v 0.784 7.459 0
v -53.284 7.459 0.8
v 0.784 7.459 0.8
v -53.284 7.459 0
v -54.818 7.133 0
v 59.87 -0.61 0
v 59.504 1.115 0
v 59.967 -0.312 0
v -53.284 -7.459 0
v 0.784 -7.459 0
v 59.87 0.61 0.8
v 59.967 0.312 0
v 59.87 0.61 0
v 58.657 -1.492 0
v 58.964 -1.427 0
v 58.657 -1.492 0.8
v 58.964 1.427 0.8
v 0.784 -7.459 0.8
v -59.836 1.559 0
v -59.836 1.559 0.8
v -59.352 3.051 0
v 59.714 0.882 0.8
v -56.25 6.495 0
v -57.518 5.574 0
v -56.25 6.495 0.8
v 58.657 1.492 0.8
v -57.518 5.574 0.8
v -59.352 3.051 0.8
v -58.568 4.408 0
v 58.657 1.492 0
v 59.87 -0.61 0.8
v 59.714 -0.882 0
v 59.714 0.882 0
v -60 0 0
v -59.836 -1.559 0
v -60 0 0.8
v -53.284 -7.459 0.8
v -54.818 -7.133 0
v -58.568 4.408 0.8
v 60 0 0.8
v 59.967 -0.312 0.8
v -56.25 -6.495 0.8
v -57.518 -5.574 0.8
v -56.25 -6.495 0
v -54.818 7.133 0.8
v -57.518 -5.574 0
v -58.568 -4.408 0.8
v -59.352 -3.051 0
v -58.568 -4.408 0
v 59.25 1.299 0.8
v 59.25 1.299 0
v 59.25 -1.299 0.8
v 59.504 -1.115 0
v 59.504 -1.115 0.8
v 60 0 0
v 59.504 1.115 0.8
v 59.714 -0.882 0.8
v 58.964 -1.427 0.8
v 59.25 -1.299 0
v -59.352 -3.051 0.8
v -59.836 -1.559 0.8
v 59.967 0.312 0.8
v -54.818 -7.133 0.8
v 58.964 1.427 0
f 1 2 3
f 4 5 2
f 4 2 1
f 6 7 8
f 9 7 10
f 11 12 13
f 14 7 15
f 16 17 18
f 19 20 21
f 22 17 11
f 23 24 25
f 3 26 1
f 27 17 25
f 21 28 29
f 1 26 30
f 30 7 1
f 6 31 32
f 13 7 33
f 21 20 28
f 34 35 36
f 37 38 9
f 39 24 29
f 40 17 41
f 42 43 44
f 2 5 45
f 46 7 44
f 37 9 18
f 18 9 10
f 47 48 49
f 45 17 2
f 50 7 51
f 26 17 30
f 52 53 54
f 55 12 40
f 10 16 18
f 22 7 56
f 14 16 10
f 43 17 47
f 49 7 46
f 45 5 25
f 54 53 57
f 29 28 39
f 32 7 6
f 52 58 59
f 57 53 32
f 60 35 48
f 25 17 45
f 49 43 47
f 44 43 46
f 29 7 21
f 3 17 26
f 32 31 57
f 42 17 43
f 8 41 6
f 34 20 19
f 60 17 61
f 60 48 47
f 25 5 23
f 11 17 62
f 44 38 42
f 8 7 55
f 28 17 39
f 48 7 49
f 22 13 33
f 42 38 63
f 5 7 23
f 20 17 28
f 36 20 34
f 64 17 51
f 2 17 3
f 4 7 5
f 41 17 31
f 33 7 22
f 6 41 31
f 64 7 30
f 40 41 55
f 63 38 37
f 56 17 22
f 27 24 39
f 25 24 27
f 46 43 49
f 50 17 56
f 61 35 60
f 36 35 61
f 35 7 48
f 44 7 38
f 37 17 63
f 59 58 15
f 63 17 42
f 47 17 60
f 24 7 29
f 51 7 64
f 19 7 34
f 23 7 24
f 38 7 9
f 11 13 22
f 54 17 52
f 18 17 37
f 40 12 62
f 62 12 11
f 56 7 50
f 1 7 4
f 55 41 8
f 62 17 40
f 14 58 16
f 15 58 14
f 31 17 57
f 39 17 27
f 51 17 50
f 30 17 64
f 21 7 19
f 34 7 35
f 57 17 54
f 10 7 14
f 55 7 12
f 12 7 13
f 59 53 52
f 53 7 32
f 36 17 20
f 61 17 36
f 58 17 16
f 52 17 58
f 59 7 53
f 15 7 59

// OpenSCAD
WIDTH = 15;
LENGTH = 120;
THICKNESS = 0.8;
POINT = 3;

$fn = 30;

hull() {
    translate([-(LENGTH-WIDTH)/2, 0, 0])
    cylinder(d = WIDTH, h = THICKNESS);

    cylinder(d = WIDTH, h = THICKNESS);

    translate([(LENGTH-POINT)/2, 0, 0])
    cylinder(d = POINT, h = THICKNESS);
}
